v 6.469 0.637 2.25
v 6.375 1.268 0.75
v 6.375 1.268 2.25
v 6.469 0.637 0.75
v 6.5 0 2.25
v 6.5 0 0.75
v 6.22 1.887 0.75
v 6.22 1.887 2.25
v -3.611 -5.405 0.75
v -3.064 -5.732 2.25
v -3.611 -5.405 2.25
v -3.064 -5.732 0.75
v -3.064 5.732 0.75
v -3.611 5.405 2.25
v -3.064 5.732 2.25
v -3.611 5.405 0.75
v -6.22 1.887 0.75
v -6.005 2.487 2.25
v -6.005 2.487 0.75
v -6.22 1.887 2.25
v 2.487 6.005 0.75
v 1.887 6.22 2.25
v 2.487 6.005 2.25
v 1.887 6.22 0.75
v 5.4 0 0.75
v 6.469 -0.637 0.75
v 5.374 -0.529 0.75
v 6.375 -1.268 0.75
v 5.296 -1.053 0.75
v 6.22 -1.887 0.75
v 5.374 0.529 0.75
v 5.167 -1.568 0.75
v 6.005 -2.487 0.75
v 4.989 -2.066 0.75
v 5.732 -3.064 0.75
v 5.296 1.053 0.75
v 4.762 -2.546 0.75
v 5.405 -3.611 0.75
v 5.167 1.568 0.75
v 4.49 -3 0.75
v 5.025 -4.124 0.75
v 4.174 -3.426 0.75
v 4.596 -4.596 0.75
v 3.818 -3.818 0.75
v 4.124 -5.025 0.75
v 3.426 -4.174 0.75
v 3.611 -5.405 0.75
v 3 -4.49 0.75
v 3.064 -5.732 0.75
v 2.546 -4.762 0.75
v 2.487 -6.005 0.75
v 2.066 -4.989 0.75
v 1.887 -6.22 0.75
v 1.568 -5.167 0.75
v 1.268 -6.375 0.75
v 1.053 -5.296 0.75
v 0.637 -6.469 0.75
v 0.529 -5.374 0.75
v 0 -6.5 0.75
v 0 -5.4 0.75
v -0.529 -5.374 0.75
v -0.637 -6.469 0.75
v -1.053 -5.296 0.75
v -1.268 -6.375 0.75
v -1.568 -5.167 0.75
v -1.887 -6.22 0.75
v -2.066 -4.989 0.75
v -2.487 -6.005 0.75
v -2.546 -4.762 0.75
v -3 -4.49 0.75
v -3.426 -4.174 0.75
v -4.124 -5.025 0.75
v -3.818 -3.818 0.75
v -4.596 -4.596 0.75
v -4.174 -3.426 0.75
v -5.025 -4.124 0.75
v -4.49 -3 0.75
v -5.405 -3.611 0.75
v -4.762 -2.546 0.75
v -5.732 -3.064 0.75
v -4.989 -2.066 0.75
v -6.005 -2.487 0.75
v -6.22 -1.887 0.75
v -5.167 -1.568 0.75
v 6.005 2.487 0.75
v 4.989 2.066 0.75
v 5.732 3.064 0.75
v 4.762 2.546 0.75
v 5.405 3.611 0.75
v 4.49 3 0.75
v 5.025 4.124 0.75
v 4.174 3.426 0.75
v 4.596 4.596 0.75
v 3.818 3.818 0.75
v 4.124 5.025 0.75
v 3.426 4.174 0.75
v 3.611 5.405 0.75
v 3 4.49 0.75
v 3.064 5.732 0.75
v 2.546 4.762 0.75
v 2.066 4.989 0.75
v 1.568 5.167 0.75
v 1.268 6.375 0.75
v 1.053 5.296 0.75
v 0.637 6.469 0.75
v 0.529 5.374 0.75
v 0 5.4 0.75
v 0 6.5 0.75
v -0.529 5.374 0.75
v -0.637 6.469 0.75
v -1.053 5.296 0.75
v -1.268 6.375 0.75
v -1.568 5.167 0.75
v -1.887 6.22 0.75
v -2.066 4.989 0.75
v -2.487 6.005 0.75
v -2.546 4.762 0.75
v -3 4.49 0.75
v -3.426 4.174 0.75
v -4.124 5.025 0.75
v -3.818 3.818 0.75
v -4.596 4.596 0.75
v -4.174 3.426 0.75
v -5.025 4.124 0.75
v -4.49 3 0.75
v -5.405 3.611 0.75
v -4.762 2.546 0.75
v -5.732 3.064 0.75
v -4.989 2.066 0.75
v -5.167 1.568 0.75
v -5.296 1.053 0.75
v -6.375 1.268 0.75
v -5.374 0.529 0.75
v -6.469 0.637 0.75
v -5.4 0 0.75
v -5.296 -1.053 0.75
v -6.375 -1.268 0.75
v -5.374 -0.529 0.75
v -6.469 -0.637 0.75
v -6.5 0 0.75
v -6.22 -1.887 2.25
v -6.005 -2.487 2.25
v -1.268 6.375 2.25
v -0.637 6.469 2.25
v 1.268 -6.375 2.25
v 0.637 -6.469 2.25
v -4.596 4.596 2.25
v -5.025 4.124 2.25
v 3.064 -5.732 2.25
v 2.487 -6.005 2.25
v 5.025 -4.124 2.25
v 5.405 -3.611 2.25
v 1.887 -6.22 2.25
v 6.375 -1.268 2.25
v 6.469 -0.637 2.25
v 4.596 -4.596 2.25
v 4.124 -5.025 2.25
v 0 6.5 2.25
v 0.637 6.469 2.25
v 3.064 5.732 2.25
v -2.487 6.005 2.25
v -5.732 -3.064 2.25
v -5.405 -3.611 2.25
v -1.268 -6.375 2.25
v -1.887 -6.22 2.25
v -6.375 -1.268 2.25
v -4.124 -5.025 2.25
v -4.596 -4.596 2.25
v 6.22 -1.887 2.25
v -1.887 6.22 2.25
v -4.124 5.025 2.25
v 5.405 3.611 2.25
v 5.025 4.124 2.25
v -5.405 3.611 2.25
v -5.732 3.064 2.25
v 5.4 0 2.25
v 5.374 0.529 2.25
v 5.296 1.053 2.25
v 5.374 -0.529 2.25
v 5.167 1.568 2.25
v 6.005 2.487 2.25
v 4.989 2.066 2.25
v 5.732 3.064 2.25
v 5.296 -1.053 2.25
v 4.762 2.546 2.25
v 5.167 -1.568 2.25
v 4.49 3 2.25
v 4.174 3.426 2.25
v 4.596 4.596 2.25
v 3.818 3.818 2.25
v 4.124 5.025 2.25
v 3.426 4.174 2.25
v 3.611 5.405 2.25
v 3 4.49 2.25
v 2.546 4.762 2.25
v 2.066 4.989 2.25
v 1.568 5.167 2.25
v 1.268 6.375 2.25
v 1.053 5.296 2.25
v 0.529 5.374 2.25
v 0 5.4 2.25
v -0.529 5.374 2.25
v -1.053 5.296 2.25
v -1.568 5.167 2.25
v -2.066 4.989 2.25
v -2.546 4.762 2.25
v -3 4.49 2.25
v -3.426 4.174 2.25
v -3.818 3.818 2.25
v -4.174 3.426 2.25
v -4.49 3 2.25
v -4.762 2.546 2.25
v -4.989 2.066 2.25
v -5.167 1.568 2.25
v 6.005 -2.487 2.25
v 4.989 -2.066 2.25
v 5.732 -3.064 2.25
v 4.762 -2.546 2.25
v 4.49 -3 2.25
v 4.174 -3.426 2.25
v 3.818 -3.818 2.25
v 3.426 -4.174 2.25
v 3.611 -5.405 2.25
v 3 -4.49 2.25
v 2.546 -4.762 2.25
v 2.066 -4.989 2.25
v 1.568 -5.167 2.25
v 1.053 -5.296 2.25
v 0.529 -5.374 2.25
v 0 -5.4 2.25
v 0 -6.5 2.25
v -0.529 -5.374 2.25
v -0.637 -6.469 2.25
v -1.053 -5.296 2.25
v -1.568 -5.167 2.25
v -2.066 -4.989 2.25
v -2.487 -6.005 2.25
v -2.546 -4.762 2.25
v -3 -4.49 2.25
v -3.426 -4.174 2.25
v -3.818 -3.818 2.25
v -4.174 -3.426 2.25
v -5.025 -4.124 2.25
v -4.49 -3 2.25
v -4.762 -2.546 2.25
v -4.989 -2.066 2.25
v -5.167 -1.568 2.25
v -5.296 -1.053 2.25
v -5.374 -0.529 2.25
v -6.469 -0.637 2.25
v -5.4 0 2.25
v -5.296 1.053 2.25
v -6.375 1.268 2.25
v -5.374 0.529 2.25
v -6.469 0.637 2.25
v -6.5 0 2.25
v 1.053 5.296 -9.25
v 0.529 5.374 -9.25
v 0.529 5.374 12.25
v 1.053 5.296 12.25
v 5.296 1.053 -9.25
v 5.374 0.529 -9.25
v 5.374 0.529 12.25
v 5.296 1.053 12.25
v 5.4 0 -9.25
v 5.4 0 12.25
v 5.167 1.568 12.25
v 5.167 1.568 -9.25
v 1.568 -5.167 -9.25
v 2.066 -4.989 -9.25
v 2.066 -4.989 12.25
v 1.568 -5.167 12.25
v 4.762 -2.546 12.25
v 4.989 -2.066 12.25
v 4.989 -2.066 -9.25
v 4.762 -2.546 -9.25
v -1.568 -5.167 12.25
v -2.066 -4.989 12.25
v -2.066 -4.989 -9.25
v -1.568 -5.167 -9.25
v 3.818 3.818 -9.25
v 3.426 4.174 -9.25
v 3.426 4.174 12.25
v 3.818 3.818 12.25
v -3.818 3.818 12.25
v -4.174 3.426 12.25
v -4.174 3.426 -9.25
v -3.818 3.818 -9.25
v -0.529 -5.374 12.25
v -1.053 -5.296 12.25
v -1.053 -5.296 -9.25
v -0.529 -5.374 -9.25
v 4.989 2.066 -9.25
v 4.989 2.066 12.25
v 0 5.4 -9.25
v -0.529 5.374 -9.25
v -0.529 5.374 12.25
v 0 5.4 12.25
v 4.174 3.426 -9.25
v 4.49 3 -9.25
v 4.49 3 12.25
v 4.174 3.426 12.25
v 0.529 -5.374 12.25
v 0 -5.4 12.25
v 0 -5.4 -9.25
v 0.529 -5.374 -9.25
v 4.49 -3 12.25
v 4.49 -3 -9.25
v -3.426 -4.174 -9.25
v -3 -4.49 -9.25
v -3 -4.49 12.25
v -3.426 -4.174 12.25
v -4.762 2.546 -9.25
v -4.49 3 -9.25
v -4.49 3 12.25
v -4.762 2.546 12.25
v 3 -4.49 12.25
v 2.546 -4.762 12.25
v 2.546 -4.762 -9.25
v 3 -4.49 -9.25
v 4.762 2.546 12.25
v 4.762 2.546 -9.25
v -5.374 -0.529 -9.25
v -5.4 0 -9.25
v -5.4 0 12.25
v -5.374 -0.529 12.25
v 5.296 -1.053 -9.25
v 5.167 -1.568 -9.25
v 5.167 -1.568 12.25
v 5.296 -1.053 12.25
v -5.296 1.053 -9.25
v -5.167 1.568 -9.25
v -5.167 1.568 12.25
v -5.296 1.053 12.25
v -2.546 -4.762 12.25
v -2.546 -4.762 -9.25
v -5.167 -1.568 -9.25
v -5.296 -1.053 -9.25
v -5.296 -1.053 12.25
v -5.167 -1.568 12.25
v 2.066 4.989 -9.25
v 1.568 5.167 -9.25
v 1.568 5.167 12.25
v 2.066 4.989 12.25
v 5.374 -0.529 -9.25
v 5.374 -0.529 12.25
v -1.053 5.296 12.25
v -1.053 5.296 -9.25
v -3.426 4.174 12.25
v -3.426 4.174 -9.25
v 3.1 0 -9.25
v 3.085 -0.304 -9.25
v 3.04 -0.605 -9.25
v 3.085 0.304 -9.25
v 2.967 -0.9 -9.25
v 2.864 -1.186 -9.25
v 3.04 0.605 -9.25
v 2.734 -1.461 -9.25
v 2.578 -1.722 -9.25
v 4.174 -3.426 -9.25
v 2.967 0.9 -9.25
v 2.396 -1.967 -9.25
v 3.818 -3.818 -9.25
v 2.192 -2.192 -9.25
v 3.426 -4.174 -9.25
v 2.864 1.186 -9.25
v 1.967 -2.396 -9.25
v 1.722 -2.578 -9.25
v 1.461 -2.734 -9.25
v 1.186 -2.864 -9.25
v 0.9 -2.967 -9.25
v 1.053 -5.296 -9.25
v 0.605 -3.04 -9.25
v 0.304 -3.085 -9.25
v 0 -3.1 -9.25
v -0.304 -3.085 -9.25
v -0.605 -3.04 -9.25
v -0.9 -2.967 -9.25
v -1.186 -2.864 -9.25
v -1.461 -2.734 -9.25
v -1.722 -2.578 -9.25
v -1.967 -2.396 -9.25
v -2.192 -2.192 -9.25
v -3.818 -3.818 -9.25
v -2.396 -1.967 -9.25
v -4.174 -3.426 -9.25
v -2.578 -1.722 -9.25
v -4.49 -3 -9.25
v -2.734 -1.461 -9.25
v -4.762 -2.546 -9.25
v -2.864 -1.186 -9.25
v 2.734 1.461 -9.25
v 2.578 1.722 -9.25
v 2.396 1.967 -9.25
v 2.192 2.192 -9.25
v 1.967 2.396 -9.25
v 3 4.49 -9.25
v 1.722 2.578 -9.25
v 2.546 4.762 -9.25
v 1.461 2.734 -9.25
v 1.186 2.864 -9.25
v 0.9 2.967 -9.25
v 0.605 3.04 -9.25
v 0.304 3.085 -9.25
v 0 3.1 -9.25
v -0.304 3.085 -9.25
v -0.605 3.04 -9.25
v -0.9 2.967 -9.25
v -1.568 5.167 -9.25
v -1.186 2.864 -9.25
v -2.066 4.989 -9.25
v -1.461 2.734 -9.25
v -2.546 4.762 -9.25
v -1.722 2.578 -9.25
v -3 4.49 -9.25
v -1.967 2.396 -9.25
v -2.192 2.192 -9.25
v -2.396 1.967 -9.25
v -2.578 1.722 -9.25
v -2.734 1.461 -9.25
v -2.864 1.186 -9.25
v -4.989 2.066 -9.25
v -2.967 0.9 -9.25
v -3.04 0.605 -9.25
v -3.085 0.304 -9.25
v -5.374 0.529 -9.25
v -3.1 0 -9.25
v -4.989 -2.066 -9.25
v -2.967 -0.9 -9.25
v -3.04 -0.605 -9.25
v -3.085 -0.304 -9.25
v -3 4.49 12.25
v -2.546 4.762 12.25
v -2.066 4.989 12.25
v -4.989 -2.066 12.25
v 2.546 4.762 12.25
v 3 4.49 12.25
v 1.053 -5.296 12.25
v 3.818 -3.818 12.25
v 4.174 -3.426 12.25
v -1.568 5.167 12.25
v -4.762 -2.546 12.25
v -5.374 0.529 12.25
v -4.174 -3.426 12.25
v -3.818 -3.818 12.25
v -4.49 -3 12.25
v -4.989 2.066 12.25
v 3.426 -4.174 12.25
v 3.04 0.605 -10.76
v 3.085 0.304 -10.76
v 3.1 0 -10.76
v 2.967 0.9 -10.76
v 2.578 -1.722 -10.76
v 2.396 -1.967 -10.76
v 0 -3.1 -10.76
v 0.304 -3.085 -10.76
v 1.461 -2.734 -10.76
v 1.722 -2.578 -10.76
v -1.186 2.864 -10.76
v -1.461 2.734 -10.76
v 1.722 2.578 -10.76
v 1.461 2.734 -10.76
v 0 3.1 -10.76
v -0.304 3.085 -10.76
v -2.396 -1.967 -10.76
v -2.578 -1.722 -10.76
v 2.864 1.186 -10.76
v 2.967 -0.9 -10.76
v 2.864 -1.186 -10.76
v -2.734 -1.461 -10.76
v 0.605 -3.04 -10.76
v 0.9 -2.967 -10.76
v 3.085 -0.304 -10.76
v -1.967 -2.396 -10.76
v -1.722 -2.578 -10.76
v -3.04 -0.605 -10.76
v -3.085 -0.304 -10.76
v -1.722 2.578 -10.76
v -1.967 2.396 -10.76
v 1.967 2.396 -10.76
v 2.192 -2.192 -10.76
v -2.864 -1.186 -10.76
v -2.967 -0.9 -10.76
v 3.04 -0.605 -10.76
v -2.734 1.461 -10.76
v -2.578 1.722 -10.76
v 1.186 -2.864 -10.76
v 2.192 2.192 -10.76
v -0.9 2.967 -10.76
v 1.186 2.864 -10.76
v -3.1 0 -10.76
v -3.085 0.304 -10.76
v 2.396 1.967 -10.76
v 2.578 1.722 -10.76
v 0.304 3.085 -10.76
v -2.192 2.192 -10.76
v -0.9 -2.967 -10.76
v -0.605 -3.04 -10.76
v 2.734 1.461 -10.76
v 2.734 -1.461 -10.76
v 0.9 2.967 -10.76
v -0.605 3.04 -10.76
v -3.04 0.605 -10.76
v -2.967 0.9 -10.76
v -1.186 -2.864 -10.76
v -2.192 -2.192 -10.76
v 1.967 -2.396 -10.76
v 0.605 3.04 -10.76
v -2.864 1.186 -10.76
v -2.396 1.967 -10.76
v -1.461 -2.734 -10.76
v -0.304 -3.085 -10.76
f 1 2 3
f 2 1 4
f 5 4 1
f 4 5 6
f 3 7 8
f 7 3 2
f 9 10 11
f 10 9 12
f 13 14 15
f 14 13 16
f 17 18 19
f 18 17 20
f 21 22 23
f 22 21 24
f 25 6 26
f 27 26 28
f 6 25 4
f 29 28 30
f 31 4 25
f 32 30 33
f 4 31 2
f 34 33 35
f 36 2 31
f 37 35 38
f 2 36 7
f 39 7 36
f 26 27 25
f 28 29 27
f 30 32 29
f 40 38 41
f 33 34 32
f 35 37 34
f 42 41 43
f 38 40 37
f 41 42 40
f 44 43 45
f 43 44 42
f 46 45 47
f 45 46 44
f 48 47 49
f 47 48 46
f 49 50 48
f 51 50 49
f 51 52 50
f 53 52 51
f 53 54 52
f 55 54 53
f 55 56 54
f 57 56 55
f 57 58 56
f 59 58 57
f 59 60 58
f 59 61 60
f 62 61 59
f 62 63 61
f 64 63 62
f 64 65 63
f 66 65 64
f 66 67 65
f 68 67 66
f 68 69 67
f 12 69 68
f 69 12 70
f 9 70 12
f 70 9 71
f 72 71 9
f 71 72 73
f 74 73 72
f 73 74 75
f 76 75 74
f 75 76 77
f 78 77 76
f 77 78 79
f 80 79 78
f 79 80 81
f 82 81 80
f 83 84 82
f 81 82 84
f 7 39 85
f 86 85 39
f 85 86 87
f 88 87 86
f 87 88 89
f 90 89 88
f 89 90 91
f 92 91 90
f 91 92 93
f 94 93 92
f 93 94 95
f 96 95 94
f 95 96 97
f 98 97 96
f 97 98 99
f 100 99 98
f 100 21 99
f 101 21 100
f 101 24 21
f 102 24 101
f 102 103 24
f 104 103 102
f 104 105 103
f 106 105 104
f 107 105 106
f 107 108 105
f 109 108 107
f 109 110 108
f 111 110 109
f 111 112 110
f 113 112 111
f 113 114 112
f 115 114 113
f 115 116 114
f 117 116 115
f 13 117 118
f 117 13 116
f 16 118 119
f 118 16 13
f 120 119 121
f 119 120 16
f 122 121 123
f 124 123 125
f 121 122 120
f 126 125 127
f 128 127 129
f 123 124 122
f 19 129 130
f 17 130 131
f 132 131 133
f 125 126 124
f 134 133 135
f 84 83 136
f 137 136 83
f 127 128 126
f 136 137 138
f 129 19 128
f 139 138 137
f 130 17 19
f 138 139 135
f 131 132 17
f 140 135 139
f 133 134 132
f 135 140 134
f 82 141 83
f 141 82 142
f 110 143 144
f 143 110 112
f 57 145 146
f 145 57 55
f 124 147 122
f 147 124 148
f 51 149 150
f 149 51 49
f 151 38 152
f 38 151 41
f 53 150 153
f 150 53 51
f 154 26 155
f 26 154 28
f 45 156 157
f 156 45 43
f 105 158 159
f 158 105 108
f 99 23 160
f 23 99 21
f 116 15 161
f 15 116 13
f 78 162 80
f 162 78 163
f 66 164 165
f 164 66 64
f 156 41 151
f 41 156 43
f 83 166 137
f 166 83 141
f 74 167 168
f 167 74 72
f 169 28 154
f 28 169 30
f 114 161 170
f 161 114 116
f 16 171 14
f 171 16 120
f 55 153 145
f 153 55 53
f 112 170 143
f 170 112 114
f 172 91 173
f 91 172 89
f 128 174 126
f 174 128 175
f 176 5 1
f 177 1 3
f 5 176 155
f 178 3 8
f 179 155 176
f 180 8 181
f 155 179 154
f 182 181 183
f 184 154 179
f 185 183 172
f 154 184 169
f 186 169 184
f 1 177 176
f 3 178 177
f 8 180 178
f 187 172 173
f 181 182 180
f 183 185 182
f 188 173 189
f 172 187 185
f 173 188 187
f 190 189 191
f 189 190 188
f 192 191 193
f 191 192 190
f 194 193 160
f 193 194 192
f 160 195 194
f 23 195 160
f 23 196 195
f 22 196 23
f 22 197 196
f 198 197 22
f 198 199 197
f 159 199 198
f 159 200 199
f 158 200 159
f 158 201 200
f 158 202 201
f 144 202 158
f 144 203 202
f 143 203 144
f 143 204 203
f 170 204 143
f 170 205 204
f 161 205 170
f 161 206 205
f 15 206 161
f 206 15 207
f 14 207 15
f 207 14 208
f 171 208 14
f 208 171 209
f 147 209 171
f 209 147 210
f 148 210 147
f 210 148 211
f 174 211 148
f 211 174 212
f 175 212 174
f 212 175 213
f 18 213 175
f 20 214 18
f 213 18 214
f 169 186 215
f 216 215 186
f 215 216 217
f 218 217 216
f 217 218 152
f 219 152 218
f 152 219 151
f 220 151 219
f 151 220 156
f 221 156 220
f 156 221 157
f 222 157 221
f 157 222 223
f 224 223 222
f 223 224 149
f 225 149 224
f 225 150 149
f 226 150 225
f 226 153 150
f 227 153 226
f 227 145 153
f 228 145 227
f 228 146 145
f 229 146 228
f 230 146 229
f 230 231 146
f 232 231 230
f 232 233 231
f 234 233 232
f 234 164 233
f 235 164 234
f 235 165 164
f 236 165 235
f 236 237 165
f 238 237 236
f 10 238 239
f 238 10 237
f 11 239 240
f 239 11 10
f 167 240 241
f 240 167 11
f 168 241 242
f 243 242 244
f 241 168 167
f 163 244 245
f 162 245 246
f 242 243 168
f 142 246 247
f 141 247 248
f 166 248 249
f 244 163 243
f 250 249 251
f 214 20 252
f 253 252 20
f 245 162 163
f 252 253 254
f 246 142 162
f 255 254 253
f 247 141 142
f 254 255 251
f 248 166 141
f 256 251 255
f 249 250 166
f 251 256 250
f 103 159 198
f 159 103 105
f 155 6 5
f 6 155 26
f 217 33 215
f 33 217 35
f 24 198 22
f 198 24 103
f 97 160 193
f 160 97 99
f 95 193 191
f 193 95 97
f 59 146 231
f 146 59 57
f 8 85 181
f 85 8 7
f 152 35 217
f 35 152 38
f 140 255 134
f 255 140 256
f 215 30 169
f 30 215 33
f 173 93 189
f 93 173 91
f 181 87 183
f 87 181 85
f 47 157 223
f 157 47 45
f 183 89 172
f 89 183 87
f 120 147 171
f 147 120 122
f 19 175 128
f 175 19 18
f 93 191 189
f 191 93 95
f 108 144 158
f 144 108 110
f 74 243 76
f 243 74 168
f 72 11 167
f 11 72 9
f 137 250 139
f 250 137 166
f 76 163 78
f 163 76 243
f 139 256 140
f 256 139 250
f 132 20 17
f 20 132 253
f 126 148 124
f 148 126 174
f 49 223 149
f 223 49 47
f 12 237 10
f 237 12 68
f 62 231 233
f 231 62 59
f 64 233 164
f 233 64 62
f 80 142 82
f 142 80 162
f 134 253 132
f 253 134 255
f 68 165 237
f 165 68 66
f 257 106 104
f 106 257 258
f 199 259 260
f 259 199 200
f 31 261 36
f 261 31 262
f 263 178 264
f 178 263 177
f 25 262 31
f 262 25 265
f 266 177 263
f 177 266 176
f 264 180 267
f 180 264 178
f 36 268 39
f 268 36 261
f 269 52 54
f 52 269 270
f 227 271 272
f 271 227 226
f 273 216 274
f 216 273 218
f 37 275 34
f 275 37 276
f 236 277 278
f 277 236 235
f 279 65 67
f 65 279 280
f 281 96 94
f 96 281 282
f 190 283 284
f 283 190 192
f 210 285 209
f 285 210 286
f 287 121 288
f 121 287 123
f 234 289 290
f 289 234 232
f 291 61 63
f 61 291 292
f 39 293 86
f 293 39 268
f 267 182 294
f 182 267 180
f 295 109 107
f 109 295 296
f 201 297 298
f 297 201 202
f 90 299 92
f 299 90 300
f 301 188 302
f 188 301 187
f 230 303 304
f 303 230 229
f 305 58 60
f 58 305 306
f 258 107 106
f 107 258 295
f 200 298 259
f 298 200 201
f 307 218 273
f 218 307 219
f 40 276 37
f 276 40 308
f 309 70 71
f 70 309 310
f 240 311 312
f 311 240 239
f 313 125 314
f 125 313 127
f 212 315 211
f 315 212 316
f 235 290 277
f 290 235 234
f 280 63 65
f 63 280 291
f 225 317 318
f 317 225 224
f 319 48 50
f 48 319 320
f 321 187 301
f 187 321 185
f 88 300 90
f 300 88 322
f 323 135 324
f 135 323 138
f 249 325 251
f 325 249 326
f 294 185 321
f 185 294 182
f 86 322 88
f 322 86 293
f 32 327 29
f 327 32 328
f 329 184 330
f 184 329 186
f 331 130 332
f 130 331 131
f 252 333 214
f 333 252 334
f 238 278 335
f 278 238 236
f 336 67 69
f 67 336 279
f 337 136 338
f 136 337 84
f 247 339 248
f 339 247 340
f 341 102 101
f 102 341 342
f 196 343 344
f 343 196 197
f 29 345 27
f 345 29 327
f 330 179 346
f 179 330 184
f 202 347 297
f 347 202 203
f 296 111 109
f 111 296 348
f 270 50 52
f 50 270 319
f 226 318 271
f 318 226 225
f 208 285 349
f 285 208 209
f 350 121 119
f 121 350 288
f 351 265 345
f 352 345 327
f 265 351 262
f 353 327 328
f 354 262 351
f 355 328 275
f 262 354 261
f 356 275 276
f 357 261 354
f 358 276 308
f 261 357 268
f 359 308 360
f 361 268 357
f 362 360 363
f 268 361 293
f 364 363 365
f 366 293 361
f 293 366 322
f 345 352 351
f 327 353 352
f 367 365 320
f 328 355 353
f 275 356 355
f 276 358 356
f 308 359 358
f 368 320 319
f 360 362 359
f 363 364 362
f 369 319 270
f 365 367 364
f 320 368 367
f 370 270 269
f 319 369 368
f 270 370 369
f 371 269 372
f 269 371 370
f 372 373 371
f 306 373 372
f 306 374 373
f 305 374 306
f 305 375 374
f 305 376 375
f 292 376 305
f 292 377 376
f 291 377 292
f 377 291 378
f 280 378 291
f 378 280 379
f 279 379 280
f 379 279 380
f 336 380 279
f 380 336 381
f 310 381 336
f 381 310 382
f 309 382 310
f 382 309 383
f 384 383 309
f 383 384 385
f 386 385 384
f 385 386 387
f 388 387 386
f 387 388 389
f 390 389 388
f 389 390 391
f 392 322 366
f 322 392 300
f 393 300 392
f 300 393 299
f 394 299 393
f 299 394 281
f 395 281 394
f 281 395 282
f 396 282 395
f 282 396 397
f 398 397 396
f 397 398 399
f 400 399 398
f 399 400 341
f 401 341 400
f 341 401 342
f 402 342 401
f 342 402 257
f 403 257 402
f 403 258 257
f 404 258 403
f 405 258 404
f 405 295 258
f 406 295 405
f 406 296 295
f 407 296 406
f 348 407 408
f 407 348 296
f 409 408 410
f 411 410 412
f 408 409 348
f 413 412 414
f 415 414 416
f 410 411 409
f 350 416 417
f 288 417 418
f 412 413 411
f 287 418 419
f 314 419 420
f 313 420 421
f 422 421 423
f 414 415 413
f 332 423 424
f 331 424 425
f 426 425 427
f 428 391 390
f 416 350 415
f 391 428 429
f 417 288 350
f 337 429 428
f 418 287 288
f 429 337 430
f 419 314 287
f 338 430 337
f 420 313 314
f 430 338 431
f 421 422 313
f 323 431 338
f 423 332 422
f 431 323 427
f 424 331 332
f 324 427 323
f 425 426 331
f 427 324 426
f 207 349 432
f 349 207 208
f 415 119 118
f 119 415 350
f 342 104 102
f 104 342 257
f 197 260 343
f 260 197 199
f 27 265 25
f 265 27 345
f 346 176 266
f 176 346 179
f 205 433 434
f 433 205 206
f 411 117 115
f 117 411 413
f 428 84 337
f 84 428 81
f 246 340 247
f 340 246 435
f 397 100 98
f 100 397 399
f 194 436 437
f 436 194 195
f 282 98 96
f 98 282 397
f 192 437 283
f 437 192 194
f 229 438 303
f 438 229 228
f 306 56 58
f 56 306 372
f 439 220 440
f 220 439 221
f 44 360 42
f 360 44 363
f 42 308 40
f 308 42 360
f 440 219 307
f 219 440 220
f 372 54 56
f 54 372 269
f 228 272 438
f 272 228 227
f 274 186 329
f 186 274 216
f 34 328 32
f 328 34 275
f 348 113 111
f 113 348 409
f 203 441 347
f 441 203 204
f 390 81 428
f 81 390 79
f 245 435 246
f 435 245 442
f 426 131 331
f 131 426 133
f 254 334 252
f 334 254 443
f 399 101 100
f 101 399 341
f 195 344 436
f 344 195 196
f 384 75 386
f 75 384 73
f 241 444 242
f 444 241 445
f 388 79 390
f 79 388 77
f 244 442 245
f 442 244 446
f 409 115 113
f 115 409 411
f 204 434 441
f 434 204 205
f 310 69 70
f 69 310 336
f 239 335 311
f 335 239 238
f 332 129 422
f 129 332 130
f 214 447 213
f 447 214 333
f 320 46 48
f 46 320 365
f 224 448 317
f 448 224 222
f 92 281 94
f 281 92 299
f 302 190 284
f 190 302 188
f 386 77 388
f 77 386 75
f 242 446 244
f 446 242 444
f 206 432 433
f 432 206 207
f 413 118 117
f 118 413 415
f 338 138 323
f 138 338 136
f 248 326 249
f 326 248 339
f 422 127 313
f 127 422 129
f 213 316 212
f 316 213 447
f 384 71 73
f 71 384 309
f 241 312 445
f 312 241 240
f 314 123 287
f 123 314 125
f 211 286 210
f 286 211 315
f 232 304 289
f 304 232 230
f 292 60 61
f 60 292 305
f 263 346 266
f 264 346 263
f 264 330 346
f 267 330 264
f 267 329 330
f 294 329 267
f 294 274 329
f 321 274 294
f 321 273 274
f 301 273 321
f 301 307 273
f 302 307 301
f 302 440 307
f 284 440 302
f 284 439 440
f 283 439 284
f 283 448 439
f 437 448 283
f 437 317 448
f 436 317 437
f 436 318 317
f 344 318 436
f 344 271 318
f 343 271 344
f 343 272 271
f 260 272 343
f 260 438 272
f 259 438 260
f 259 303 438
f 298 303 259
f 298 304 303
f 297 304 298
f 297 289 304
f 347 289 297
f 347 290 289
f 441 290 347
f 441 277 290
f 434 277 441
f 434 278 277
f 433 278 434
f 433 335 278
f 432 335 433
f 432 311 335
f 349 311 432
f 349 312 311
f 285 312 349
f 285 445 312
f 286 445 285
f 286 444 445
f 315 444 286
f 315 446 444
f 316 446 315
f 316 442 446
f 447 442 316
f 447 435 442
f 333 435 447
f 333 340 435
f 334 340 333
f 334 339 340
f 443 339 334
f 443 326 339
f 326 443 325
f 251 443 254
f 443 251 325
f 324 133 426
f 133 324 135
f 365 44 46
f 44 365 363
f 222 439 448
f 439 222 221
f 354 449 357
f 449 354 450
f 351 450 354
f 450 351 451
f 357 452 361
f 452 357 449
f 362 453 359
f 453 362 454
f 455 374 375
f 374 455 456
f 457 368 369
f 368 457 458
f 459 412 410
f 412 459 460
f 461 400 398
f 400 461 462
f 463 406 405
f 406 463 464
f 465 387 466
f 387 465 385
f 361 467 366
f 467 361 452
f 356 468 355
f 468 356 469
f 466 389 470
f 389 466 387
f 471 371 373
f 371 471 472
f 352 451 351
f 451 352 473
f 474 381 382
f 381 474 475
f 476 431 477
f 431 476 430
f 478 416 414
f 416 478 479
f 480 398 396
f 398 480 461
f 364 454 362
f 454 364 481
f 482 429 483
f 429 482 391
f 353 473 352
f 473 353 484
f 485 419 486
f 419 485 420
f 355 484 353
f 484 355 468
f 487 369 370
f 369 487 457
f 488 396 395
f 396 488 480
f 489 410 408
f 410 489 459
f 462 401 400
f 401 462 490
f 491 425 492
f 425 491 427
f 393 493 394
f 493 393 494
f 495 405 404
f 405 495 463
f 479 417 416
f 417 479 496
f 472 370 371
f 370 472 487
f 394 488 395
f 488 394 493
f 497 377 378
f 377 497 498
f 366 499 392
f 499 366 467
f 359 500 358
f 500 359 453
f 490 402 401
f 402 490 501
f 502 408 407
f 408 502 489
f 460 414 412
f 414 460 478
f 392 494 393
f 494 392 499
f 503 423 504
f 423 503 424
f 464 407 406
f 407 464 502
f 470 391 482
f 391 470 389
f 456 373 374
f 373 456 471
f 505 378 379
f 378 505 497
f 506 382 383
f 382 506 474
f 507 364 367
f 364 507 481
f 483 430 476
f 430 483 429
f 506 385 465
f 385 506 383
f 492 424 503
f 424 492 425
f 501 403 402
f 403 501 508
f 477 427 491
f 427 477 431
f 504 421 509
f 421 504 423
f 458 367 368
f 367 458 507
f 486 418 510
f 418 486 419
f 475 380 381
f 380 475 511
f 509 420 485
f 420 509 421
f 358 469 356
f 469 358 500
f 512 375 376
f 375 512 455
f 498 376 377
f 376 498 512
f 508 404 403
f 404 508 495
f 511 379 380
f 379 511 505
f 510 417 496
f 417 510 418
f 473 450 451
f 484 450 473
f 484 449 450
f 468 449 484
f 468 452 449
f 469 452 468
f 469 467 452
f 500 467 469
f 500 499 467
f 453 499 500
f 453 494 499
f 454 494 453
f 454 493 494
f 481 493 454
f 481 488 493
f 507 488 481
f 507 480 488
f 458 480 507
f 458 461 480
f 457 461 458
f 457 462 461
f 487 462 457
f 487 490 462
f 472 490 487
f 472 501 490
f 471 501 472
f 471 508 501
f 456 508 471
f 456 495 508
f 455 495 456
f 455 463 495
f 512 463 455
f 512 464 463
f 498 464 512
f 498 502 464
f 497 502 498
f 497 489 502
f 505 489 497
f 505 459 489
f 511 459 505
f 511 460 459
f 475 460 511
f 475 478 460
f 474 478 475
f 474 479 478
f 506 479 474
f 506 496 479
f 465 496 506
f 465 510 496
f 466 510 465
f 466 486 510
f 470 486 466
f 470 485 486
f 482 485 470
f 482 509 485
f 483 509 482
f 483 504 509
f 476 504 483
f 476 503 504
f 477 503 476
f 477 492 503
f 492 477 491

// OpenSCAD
// Dimensions for 0.2 mL PCR Tube Adapter
// Units: mm

// Outer Diameter of the main sleeve body
sleeve_od = 10.8;
// Diameter of the collar that sits on the bed
collar_od = 13.0;
// Height of the collar (thickness)
collar_height = 1.5;
// Total height of the sleeve body
sleeve_height = 21.5;
// Diameter of the bore (hole) for the tube
bore_diameter = 6.2;
// Wall thickness of the sleeve
wall_thickness = (sleeve_od - bore_diameter) / 2;

// Rendering settings
$fn = 64;

module main() {
    // The part is built on the XY plane (z=0) and grows upwards.
    
    // 1. The Base Collar
    // A flat disc that sits on the bed
    translate([0, 0, collar_height])
        cylinder(d = collar_od, h = collar_height, center = true);
    
    // 2. The Main Sleeve Body
    // Extrudes from the top of the collar to the full height
    translate([0, 0, collar_height])
        cylinder(d = sleeve_od, h = sleeve_height, center = true);
    
    // 3. The Bore
    // A cylinder cut through the entire part
    // It extends 0.01mm past the top and bottom faces to ensure clean cuts
    cylinder(d = bore_diameter, h = sleeve_height + 0.02, center = true);
}

// Render the part
main();
